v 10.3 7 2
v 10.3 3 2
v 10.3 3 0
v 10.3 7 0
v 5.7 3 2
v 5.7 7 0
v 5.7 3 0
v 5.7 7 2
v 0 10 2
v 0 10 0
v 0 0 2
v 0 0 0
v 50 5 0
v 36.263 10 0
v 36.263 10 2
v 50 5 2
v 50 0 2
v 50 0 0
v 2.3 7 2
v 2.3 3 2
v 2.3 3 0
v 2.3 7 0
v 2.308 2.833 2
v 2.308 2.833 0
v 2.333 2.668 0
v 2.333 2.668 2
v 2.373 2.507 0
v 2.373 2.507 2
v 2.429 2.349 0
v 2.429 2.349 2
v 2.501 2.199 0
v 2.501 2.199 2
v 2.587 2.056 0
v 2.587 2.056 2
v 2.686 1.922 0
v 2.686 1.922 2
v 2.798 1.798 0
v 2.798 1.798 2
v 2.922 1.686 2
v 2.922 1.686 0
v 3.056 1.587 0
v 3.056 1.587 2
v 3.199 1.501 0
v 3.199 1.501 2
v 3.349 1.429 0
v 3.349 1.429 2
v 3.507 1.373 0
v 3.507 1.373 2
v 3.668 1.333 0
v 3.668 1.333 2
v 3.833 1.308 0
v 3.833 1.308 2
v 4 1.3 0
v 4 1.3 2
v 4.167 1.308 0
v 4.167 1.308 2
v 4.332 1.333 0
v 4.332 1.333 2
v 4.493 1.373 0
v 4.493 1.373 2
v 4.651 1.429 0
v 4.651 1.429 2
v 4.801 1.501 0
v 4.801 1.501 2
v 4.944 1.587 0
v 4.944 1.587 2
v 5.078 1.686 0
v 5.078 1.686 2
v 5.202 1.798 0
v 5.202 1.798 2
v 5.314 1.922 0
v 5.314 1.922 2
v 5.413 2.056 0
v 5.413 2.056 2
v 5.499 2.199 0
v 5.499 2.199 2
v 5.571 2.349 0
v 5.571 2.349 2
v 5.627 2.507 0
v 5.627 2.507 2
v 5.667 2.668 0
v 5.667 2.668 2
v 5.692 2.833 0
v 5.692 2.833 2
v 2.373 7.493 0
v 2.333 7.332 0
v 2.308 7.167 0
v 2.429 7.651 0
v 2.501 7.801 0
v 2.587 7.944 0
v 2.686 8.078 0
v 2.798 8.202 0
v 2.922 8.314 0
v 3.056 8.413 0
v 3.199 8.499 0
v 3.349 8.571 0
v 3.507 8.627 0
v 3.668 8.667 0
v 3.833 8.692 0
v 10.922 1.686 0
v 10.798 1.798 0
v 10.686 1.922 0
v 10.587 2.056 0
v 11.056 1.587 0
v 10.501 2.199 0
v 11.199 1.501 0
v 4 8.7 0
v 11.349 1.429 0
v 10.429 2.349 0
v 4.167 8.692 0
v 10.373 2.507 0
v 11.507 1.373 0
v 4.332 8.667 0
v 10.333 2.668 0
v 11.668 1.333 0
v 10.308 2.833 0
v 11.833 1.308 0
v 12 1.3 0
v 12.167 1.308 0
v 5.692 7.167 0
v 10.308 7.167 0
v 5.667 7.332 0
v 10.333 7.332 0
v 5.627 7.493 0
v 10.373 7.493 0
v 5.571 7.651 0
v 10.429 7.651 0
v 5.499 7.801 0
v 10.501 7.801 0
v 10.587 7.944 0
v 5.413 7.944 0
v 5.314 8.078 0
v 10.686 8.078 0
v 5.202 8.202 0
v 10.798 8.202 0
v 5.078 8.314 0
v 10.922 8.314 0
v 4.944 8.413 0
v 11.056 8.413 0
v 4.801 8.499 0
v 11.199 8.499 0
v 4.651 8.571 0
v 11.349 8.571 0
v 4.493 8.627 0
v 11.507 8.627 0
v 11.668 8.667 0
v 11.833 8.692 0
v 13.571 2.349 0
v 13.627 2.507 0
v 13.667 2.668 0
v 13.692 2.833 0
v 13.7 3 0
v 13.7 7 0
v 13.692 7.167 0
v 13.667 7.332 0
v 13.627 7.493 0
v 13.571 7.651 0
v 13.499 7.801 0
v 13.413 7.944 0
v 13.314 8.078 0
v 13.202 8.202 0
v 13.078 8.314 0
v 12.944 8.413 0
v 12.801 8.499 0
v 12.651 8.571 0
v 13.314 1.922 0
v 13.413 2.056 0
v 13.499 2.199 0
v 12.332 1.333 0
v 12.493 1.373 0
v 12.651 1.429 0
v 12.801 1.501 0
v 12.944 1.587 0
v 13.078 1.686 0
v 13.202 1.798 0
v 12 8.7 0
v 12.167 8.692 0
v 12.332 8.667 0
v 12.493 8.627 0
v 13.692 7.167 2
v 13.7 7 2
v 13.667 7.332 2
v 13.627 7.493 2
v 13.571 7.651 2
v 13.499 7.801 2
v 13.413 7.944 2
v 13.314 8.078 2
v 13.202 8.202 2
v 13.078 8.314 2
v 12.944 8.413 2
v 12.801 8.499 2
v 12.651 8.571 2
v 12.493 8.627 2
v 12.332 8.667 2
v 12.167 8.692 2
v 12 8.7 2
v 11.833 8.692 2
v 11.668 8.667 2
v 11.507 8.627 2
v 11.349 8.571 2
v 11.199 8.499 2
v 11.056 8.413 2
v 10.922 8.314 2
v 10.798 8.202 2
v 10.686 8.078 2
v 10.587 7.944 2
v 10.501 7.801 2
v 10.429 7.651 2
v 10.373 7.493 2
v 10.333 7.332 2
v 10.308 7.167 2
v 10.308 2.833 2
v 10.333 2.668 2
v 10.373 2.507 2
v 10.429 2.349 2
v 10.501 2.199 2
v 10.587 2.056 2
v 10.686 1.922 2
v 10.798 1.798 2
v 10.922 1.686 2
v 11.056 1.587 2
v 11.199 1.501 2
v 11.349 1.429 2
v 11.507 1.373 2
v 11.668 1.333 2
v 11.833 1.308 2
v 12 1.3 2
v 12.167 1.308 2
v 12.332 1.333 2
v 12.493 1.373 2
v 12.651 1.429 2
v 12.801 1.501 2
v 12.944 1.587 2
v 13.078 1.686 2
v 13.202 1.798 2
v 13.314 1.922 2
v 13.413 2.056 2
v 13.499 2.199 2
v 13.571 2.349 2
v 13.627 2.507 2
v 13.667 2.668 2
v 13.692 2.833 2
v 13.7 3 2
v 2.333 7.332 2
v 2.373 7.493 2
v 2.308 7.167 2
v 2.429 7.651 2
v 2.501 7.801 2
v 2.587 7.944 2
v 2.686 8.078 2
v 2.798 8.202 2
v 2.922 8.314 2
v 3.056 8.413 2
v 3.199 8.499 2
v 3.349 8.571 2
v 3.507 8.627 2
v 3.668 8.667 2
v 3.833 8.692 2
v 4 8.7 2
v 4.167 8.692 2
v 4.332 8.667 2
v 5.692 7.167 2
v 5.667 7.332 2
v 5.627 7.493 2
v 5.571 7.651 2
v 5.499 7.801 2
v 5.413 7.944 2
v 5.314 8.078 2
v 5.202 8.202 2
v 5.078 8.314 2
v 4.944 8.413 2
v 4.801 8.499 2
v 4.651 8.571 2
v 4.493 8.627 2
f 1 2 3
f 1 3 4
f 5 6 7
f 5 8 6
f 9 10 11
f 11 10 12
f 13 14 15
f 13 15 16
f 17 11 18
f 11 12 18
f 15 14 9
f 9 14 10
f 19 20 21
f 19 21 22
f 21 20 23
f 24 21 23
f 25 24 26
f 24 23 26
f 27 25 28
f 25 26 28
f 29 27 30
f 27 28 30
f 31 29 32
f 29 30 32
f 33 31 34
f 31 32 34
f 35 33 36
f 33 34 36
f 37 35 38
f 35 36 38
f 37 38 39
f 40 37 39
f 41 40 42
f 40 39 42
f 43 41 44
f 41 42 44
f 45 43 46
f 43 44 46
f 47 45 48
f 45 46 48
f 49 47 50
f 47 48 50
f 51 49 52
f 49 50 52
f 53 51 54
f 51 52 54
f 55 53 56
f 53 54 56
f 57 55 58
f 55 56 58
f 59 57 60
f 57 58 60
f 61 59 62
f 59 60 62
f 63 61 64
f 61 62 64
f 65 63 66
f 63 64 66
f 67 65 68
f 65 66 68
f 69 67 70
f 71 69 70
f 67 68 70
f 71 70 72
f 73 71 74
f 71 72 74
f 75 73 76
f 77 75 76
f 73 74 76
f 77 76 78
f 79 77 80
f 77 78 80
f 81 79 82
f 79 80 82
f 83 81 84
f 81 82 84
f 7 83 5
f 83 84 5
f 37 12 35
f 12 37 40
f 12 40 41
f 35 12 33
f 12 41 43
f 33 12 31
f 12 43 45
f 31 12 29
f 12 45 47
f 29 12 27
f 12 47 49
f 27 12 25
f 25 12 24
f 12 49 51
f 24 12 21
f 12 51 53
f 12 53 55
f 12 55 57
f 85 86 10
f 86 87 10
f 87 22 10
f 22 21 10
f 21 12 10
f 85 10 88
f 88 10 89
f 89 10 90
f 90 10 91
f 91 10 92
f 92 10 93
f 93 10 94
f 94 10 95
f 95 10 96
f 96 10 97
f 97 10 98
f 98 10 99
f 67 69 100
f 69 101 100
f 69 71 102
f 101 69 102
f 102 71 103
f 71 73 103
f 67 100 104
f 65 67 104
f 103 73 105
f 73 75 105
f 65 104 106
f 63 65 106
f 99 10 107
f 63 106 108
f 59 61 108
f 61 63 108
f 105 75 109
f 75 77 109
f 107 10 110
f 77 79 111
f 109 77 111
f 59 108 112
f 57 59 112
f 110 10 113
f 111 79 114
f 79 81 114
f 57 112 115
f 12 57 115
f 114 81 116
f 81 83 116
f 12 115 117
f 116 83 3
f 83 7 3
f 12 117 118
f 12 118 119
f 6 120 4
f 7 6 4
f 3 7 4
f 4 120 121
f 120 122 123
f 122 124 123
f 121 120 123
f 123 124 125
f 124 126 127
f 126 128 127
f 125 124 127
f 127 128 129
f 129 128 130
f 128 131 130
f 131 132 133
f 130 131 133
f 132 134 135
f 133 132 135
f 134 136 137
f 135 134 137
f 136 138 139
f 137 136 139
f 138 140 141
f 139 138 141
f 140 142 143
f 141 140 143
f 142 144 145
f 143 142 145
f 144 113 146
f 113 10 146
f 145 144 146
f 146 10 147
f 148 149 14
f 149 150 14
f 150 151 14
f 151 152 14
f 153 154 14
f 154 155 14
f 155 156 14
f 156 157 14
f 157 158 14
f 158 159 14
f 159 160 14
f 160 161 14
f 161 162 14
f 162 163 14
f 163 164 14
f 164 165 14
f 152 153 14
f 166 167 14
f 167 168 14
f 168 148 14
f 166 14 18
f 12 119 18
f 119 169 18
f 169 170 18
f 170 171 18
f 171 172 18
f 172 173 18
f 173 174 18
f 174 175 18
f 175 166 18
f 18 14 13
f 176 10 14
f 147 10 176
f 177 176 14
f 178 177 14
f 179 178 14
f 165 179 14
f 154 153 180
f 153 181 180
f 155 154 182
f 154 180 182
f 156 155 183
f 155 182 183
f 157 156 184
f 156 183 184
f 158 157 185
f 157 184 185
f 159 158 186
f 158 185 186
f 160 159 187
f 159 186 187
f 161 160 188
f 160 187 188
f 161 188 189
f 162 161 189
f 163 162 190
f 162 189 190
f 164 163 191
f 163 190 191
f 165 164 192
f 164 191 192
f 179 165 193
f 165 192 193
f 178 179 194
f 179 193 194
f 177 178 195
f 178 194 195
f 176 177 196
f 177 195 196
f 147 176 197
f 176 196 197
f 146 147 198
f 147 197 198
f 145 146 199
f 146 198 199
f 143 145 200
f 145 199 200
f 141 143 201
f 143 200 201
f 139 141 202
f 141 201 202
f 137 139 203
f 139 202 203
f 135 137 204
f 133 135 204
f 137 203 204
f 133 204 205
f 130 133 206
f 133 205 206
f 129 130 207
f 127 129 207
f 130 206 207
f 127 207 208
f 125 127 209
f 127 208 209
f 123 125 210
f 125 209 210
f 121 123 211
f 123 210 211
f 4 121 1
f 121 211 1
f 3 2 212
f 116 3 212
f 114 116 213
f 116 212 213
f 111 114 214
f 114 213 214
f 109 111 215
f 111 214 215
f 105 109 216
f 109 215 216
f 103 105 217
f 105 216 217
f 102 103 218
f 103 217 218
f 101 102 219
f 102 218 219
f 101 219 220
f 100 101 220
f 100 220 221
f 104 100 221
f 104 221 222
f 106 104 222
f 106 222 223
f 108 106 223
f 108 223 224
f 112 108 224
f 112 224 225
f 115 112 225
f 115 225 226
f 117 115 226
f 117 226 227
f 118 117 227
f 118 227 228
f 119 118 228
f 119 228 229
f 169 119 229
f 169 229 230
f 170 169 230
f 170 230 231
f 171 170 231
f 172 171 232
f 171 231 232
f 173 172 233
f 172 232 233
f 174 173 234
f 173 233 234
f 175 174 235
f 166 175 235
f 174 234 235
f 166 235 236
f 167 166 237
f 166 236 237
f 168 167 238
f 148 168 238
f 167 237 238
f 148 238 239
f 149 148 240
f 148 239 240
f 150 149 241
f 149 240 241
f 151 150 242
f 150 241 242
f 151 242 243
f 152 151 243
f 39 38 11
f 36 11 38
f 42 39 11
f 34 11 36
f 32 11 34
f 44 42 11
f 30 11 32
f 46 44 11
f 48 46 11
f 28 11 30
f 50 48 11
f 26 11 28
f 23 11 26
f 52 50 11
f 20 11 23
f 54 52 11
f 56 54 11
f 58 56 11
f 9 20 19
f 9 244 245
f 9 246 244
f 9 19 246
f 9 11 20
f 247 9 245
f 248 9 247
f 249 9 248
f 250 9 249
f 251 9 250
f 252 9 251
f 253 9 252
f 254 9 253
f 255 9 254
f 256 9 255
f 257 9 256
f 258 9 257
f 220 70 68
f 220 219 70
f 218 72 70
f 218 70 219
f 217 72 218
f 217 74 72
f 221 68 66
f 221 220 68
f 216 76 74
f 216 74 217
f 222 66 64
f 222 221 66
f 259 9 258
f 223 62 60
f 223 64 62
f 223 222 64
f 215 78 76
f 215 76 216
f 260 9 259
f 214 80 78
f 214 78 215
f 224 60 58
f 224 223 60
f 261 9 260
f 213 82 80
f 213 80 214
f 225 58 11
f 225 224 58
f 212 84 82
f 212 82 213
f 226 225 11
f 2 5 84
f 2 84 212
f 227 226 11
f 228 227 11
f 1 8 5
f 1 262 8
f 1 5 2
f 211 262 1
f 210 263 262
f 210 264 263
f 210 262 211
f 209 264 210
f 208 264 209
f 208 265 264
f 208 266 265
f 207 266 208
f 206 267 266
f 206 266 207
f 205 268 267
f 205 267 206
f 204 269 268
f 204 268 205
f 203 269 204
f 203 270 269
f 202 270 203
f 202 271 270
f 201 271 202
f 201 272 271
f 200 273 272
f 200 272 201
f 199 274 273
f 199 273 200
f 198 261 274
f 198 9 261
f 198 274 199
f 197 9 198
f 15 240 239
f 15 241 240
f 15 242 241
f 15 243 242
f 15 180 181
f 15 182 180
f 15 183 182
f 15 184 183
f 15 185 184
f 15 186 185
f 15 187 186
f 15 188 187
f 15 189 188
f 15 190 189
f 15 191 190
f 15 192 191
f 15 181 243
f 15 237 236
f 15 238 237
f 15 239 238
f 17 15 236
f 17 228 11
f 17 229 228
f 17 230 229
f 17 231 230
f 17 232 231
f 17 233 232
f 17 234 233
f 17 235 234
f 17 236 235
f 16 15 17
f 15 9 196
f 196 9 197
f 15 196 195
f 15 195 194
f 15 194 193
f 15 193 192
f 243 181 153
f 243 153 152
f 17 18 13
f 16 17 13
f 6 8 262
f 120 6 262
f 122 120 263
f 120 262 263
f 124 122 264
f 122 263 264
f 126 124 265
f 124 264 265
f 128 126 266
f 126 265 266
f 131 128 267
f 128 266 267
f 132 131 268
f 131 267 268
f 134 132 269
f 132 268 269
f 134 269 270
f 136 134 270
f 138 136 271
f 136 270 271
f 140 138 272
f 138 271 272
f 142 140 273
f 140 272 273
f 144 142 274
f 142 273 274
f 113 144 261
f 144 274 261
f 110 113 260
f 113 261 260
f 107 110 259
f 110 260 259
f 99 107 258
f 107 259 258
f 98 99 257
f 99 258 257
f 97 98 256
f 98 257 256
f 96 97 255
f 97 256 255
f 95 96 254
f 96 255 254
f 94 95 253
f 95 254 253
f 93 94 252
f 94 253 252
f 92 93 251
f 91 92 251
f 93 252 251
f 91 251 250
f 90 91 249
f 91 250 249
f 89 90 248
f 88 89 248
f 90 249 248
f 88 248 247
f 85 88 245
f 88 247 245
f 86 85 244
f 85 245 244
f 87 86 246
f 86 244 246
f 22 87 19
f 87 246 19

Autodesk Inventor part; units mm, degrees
ref_plane "YZ Plane" through (0, 0, 0) normal (1, 0, 0) x (0, 1, 0)
ref_plane "XZ Plane" through (0, 0, 0) normal (0, 1, 0) x (-1, 0, 0)
ref_plane "XY Plane" through (0, 0, 0) normal (0, 0, 1) x (1, 0, 0)
sketch "Skizze1" plane through (0, 0, 0) normal (0, 0, 1) x (1, 0, 0)
  line L0 (0, 0) -> (50, 0)
  line L1 (50, 0) -> (50, 5)
  line L2 (36.2626, 10) -> (0, 10)
  line L3 (0, 10) -> (0, 0)
  line L4 (36.2626, 10) -> (50, 5)
  dimension "d0" = 10
  dimension "d1" = 50
  dimension "d2" = 5
  dimension "d5" = 20
extrude "Extrusion1" add sketch "Skizze1" along normal blind 2
sketch "Skizze2" plane through (0, 0, 2) normal (0, 0, 1) x (1, 0, 0)
  line L0 (0, 0) -> (0, 10) projected
  line L1 (0, 10) -> (36.2626, 10) projected
  line L2 (0, 5) -> (28.2614, 5)
  point P0 (4, 5)
  point P1 (12, 5)
  dimension "d8" = 4
  dimension "d9" = 8
hole "Bohrung1" at (4, 5, 2) at (12, 5, 2) direction (0, 0, -1) diameter 3.4 end through all
sketch "Skizze4" plane through (0, 0, 2) normal (0, 0, 1) x (1, 0, 0)
  circle A0 centre (4, 5) radius 1.7 projected
  line L0 (50, 0) -> (0, 0) projected
  line L1 (0, 10) -> (36.2626, 10) projected
  line L2 (5.7, 7) -> (5.7, 3)
  line L3 (2.3, 3) -> (2.3, 7)
  arc A1 (5.7, 7) -> (2.3, 7) centre (4, 7) ccw
  arc A2 (2.3, 3) -> (5.7, 3) centre (4, 3) ccw
  dimension "d17" = 3
  dimension "d18" = 3
  dimension "d19" = 4
extrude "Extrusion2" cut sketch "Skizze4" against normal through all contours L2 A2 L3 A0 | A0 L3 A1 L2
pattern_linear "Rechteckige Anordnung1" count 2 spacing 8 along (1, 0, 0) of "Extrusion2"
properties part number "13_0204_068"
